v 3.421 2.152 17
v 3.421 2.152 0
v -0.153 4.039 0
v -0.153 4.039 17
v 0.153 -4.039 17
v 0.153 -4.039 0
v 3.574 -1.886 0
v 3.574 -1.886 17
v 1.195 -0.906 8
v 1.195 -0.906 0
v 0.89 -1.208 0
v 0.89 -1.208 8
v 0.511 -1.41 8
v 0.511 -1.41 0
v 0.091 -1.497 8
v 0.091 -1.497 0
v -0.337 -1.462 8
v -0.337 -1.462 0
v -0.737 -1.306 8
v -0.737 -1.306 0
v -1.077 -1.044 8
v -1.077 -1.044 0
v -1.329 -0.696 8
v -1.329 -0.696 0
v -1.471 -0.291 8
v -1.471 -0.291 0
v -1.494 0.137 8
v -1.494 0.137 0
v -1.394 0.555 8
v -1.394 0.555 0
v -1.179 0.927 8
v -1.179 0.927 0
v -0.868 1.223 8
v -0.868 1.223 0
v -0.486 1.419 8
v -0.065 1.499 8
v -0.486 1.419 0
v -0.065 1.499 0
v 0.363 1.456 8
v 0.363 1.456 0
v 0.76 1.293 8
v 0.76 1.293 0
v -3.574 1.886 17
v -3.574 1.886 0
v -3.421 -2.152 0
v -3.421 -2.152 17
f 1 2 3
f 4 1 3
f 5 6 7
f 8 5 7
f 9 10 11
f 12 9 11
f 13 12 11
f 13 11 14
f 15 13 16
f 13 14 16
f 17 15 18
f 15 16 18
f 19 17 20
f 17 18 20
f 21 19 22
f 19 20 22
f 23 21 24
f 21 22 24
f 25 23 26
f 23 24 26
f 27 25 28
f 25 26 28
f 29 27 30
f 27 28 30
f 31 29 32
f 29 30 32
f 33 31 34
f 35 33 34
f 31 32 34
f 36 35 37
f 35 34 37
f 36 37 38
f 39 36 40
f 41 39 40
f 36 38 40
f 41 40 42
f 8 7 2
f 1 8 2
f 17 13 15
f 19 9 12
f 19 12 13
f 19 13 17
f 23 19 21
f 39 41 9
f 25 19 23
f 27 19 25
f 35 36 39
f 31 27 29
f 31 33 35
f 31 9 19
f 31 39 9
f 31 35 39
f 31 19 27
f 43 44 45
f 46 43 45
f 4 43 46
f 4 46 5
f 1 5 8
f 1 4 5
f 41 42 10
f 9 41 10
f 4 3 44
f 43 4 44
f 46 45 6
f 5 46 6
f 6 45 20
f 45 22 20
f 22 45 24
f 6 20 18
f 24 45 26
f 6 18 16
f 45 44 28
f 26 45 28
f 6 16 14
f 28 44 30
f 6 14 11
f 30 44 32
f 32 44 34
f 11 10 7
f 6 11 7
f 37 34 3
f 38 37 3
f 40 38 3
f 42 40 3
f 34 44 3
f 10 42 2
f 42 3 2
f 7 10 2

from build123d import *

# Parameters (mm, degrees)
BOSS_EXTRUDE1_DEPTH = 17
CUT_EXTRUDE7_DEPTH  = 8


with BuildPart() as part:
    # Sketch1 → Boss-Extrude1 (new body)
    with BuildSketch(Plane.XY):
        Polygon((3.574198426, -1.886382503), (3.420754381, 2.152155384), (-0.153444044, 4.038537886), (-3.574198426, 1.886382503), (-3.420754381, -2.152155384), (0.153444044, -4.038537886), align=None)
    extrude(amount=BOSS_EXTRUDE1_DEPTH)

    # Sketch2 → Cut-Extrude7 (cut)
    with BuildSketch(Plane.XY):
        with BuildLine():
            Line((0.76003439, 1.293192842), (1.195356952, -0.906157689))
            ThreePointArc((1.195356952, -0.906157689), (-1.471453198, -0.291248151), (0.76003439, 1.293192842))
        make_face()
    extrude(amount=CUT_EXTRUDE7_DEPTH, mode=Mode.SUBTRACT)


solid = part.part
